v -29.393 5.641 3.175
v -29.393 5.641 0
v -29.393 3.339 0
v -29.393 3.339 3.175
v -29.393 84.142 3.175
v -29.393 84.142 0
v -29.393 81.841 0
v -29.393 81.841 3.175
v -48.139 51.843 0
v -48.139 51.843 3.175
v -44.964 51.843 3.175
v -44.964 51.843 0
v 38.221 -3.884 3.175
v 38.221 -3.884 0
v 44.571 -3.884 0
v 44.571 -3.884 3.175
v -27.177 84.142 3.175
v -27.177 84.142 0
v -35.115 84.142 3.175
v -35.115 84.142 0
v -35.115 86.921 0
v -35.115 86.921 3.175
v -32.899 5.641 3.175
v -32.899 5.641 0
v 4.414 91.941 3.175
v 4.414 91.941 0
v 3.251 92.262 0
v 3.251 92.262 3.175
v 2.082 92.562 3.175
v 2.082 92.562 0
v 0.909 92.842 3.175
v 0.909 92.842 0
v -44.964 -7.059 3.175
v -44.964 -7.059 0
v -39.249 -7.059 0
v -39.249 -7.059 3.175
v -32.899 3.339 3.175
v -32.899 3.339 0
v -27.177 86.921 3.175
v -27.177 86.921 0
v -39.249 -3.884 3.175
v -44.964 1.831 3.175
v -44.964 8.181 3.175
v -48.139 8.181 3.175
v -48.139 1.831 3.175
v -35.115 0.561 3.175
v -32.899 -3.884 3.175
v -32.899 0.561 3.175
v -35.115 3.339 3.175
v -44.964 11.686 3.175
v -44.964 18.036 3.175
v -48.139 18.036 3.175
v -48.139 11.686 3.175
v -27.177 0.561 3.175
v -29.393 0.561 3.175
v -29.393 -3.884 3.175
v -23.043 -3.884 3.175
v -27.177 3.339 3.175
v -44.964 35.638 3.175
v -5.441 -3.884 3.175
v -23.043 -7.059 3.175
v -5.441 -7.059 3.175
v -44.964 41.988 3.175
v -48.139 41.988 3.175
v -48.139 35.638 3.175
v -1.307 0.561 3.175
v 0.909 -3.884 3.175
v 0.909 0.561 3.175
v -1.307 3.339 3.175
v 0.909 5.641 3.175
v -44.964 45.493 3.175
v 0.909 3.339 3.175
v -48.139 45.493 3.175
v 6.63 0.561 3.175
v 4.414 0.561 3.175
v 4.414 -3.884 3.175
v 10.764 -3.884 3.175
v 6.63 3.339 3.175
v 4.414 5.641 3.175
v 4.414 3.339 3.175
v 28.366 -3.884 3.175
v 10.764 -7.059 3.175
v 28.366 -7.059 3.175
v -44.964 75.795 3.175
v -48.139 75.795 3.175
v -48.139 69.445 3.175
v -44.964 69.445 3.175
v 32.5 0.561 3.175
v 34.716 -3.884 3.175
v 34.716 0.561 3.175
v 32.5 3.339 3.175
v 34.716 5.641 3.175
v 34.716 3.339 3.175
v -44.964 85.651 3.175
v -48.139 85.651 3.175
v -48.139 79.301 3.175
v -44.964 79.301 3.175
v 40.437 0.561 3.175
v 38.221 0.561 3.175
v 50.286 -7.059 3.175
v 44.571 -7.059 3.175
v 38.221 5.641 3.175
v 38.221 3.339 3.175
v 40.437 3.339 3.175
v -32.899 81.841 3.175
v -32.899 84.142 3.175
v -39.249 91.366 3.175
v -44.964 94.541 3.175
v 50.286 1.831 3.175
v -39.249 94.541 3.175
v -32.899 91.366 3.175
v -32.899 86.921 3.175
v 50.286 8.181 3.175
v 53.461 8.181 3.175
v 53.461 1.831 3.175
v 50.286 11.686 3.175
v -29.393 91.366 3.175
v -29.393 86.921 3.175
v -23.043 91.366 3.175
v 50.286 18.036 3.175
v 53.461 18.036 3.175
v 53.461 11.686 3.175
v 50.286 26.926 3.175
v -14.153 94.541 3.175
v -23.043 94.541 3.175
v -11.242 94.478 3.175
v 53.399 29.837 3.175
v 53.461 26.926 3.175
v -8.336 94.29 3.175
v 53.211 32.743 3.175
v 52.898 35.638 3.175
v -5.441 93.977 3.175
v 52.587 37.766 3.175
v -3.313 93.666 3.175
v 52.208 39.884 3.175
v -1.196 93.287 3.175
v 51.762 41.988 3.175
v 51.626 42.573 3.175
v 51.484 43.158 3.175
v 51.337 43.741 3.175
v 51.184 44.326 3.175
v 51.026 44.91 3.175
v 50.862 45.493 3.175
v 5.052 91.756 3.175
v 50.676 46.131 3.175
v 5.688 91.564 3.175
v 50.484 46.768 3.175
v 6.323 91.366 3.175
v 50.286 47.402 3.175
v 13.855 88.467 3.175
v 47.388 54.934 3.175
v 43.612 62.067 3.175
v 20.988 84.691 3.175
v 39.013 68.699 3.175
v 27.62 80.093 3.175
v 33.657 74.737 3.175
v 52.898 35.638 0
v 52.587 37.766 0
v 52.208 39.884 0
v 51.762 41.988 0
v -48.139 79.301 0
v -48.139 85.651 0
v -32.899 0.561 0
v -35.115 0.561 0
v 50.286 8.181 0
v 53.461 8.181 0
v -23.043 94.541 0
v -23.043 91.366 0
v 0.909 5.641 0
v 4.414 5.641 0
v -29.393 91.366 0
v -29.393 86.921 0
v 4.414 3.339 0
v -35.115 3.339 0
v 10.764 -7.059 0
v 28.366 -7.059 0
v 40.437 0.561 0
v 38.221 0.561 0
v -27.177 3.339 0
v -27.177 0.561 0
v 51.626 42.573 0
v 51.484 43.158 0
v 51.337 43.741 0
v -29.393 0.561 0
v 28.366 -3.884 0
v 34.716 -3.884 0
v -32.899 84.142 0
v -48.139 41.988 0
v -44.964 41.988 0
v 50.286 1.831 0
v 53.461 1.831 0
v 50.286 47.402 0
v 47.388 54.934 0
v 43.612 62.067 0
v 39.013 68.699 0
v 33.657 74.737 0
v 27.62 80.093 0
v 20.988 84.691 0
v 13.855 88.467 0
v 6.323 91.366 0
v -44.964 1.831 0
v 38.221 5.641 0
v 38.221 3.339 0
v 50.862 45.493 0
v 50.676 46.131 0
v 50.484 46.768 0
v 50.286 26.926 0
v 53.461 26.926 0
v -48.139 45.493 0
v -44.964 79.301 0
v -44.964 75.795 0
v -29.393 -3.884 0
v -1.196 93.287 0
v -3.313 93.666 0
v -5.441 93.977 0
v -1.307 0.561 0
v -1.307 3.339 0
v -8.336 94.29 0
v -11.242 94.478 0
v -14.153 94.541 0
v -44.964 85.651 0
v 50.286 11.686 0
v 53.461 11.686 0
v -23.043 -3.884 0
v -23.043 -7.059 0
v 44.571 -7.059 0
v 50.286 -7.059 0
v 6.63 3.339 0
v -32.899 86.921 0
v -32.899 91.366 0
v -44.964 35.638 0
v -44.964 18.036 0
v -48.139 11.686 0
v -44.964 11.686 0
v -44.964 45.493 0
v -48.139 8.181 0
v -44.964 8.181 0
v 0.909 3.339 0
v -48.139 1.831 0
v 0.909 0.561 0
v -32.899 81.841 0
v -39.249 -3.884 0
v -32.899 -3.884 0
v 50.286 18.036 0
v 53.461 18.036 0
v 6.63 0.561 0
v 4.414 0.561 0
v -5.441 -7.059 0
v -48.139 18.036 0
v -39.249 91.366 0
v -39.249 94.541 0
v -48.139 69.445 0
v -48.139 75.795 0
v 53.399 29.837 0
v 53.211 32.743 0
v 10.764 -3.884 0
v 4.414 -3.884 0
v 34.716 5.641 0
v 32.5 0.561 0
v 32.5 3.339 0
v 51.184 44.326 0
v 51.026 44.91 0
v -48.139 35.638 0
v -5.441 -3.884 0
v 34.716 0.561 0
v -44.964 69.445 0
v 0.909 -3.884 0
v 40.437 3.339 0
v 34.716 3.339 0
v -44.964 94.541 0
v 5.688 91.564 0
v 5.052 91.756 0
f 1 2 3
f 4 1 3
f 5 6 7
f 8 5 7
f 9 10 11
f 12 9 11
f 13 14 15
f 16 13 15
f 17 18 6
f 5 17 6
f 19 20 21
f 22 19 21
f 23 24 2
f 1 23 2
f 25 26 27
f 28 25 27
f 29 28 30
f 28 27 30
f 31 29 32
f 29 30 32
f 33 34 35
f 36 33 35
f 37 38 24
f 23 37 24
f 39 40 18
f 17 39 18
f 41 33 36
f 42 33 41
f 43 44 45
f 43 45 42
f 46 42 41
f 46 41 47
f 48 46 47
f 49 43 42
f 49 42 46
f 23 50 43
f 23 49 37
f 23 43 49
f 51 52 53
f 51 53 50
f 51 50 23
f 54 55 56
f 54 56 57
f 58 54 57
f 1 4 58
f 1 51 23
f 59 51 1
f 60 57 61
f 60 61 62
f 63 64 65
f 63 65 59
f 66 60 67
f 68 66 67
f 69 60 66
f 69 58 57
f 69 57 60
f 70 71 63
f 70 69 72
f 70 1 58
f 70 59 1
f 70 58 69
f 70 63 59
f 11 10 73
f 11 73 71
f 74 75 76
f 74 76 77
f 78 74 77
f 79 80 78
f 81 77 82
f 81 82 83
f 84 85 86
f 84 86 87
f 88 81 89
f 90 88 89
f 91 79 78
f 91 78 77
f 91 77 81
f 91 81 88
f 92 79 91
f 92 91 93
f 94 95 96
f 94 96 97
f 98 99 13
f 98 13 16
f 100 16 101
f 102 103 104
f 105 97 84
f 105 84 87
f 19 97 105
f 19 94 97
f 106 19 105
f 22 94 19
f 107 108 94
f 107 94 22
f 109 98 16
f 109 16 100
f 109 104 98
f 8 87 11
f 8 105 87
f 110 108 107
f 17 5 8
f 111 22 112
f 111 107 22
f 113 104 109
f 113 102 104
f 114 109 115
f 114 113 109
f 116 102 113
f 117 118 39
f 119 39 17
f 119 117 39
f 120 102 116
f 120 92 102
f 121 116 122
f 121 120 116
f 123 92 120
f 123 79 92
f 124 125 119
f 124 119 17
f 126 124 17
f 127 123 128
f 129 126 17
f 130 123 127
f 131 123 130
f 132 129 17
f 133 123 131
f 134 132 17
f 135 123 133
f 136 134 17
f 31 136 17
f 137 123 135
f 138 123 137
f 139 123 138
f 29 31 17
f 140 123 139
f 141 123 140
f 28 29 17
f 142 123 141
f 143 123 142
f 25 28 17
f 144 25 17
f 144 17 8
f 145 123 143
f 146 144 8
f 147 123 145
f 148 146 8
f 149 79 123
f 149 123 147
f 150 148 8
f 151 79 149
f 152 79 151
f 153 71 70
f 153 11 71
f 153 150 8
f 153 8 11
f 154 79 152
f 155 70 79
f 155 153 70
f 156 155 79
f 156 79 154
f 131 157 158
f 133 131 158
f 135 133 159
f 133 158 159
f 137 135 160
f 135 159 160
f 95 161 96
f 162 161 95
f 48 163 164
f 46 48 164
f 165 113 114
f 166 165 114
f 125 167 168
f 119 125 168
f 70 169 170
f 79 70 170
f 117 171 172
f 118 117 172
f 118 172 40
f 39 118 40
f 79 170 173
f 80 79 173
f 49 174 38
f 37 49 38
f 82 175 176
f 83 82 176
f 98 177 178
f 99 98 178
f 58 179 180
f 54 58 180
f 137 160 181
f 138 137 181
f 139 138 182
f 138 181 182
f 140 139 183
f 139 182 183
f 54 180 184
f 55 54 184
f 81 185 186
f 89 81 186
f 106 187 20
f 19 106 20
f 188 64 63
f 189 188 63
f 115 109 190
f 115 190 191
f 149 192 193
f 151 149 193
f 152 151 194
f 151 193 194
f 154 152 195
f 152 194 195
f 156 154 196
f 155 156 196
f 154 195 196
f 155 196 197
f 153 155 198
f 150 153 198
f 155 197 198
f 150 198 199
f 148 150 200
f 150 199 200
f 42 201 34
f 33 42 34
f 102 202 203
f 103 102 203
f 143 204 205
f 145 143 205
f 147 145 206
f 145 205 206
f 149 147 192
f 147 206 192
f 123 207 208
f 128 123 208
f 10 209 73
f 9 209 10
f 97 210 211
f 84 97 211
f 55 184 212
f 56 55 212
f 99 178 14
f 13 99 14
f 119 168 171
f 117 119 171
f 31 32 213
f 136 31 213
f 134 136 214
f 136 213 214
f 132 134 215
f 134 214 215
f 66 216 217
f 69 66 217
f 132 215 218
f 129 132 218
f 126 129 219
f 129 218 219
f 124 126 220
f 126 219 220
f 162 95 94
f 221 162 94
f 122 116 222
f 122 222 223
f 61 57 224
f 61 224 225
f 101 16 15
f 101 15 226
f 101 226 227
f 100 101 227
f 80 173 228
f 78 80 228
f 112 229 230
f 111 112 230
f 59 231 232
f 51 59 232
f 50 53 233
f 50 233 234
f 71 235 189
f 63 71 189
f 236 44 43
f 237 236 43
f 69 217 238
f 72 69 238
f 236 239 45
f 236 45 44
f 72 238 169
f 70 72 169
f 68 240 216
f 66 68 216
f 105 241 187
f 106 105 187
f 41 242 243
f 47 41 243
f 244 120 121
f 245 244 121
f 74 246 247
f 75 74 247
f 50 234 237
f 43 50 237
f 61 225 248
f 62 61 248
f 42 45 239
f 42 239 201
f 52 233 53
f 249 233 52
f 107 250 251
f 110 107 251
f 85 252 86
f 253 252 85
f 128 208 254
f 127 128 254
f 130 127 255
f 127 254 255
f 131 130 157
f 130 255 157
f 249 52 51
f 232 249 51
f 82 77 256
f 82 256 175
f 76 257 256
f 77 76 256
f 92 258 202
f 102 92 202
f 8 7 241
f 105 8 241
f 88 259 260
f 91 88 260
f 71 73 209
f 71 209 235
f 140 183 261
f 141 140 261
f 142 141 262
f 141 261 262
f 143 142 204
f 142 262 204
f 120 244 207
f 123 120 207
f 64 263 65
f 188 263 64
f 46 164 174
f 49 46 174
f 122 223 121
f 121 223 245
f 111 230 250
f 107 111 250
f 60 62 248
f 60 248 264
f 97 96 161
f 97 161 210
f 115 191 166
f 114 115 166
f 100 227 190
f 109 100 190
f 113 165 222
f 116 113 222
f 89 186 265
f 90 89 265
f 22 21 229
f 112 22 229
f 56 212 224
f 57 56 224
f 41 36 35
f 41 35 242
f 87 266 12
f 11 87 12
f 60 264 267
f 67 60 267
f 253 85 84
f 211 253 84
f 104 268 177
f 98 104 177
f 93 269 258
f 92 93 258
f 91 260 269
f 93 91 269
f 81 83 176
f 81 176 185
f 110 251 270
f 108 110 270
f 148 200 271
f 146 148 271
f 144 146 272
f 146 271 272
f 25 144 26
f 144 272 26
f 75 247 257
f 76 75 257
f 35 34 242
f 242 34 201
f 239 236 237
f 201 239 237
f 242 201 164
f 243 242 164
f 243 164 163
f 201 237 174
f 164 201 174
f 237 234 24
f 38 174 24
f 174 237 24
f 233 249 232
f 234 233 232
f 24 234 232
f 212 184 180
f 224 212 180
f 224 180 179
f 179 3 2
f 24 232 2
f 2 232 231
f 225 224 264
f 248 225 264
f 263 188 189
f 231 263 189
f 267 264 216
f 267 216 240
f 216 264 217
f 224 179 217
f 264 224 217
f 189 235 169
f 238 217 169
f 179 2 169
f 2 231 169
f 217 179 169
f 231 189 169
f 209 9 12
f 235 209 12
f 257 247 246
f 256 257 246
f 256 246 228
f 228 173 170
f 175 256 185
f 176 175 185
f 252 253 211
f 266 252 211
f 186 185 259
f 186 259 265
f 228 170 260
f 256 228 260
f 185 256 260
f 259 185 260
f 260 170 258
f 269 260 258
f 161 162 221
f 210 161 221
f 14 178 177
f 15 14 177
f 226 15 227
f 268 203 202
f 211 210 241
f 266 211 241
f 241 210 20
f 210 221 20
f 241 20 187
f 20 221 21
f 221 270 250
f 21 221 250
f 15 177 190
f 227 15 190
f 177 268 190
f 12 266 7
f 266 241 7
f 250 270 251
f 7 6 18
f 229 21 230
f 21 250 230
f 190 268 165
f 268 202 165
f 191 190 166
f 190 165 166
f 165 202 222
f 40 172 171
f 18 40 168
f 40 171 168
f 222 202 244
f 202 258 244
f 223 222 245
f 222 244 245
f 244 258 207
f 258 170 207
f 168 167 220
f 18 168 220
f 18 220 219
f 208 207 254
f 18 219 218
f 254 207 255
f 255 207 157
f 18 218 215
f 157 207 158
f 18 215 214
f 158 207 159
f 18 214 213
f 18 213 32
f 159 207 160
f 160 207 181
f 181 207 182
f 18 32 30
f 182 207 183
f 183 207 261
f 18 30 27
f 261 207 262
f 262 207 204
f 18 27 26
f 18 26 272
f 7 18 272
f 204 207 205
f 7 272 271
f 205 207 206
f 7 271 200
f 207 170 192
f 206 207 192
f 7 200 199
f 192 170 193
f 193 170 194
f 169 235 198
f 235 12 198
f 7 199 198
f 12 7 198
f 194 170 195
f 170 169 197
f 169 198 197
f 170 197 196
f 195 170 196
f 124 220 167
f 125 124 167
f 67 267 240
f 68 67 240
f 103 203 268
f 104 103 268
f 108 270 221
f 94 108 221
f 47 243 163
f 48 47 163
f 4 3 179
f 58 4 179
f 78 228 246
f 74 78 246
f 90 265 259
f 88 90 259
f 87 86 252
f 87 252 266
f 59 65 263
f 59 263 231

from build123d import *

# Parameters (mm, degrees)
F0_W     = 3.175
F0_H     = 6.35
F0_W_2   = 3.5052
F0_H_2   = 4.445
F0_H_3   = 2.778125
F0_W_3   = 2.21615
F0_H_4   = 2.301875
F1_DEPTH = 3.175


with BuildPart() as f1:
    # F0 (on Top) → F1 (new body)
    with BuildSketch(Plane.XY):
        with BuildLine():
            Line((-39.248683933, 94.5405161858), (-44.963683933, 94.5405161858))
            Line((-44.963683933, 94.5405161858), (-44.963683933, 85.6505161858))
            Line((-44.963683933, 85.6505161858), (-44.963683933, 79.3005161858))
            Line((-44.963683933, 79.3005161858), (-44.963683933, 75.7953161858))
            Line((-44.963683933, 75.7953161858), (-44.963683933, 69.4453161858))
            Line((-44.963683933, 69.4453161858), (-44.963683933, 51.8431161858))
            Line((-44.963683933, 51.8431161858), (-44.963683933, 45.4931161858))
            Line((-44.963683933, 45.4931161858), (-44.963683933, 43.7405161858))
            Line((-44.963683933, 43.7405161858), (50.286316067, 43.7405161858))
            Line((50.286316067, 43.7405161858), (50.286316067, 45.4931161858))
            Line((50.286316067, 45.4931161858), (50.286316067, 47.4018817204))
            ThreePointArc((50.286316067, 47.4018817204), (33.6573996556, 74.7365997743), (6.3226816016, 91.3655161858))
            Line((6.3226816016, 91.3655161858), (4.413916067, 91.3655161858))
            Line((4.413916067, 91.3655161858), (4.413916067, 86.9205161858))
            Line((4.413916067, 86.9205161858), (6.630066067, 86.9205161858))
            Line((6.630066067, 86.9205161858), (6.630066067, 84.1423911858))
            Line((6.630066067, 84.1423911858), (4.413916067, 84.1423911858))
            Line((4.413916067, 84.1423911858), (4.413916067, 81.8405161858))
            Line((4.413916067, 81.8405161858), (0.908716067, 81.8405161858))
            Line((0.908716067, 81.8405161858), (0.908716067, 84.1423911858))
            Line((0.908716067, 84.1423911858), (-1.307433933, 84.1423911858))
            Line((-1.307433933, 84.1423911858), (-1.307433933, 86.9205161858))
            Line((-1.307433933, 86.9205161858), (0.908716067, 86.9205161858))
            Line((0.908716067, 86.9205161858), (0.908716067, 91.3655161858))
            Line((0.908716067, 91.3655161858), (-5.441283933, 91.3655161858))
            Line((-5.441283933, 91.3655161858), (-5.441283933, 93.9768813524))
            ThreePointArc((-5.441283933, 93.9768813524), (-9.7882773782, 94.3994603443), (-14.153483933, 94.5405161858))
            Line((-14.153483933, 94.5405161858), (-23.043483933, 94.5405161858))
            Line((-23.043483933, 94.5405161858), (-23.043483933, 91.3655161858))
            Line((-23.043483933, 91.3655161858), (-29.393483933, 91.3655161858))
            Line((-29.393483933, 91.3655161858), (-29.393483933, 86.9205161858))
            Line((-29.393483933, 86.9205161858), (-27.177333933, 86.9205161858))
            Line((-27.177333933, 86.9205161858), (-27.177333933, 84.1423911858))
            Line((-27.177333933, 84.1423911858), (-29.393483933, 84.1423911858))
            Line((-29.393483933, 84.1423911858), (-29.393483933, 81.8405161858))
            Line((-29.393483933, 81.8405161858), (-32.898683933, 81.8405161858))
            Line((-32.898683933, 81.8405161858), (-32.898683933, 84.1423911858))
            Line((-32.898683933, 84.1423911858), (-35.114833933, 84.1423911858))
            Line((-35.114833933, 84.1423911858), (-35.114833933, 86.9205161858))
            Line((-35.114833933, 86.9205161858), (-32.898683933, 86.9205161858))
            Line((-32.898683933, 86.9205161858), (-32.898683933, 91.3655161858))
            Line((-32.898683933, 91.3655161858), (-39.248683933, 91.3655161858))
            Line((-39.248683933, 91.3655161858), (-39.248683933, 94.5405161858))
        make_face()
        with Locations((-46.551183933, 82.4755161858)):
            Rectangle(F0_W, F0_H)
        with Locations((-46.551183933, 72.6203161858)):
            Rectangle(F0_W, F0_H)
        with Locations((-46.551183933, 48.6681161858)):
            Rectangle(F0_W, F0_H)
        with BuildLine():
            ThreePointArc((0.908716067, 92.8415057221), (-2.252736339, 93.4849633701), (-5.441283933, 93.9768813524))
            Line((-5.441283933, 93.9768813524), (-5.441283933, 91.3655161858))
            Line((-5.441283933, 91.3655161858), (0.908716067, 91.3655161858))
            Line((0.908716067, 91.3655161858), (0.908716067, 92.8415057221))
        make_face()
        with BuildLine():
            ThreePointArc((4.413916067, 91.9411976981), (2.6673405912, 92.4148071961), (0.908716067, 92.8415057221))
            Line((0.908716067, 92.8415057221), (0.908716067, 91.3655161858))
            Line((0.908716067, 91.3655161858), (4.413916067, 91.3655161858))
            Line((4.413916067, 91.3655161858), (4.413916067, 91.9411976981))
        make_face()
        Polygon((50.286316067, 43.7405161858), (-44.963683933, 43.7405161858), (-44.963683933, 41.9879161858), (-44.963683933, 35.6379161858), (-44.963683933, 18.0357161858), (-44.963683933, 11.6857161858), (-44.963683933, 8.1805161858), (-44.963683933, 1.8305161858), (-44.963683933, -7.0594838142), (-39.248683933, -7.0594838142), (-39.248683933, -3.8844838142), (-32.898683933, -3.8844838142), (-32.898683933, 0.5605161858), (-35.114833933, 0.5605161858), (-35.114833933, 3.3386411858), (-32.898683933, 3.3386411858), (-32.898683933, 5.6405161858), (-29.393483933, 5.6405161858), (-29.393483933, 3.3386411858), (-27.177333933, 3.3386411858), (-27.177333933, 0.5605161858), (-29.393483933, 0.5605161858), (-29.393483933, -3.8844838142), (-23.043483933, -3.8844838142), (-23.043483933, -7.0594838142), (-5.441283933, -7.0594838142), (-5.441283933, -3.8844838142), (0.908716067, -3.8844838142), (0.908716067, 0.5605161858), (-1.307433933, 0.5605161858), (-1.307433933, 3.3386411858), (0.908716067, 3.3386411858), (0.908716067, 5.6405161858), (4.413916067, 5.6405161858), (4.413916067, 3.3386411858), (6.630066067, 3.3386411858), (6.630066067, 0.5605161858), (4.413916067, 0.5605161858), (4.413916067, -3.8844838142), (10.763916067, -3.8844838142), (10.763916067, -7.0594838142), (28.366116067, -7.0594838142), (28.366116067, -3.8844838142), (34.716116067, -3.8844838142), (34.716116067, 0.5605161858), (32.499966067, 0.5605161858), (32.499966067, 3.3386411858), (34.716116067, 3.3386411858), (34.716116067, 5.6405161858), (38.221316067, 5.6405161858), (38.221316067, 3.3386411858), (40.437466067, 3.3386411858), (40.437466067, 0.5605161858), (38.221316067, 0.5605161858), (38.221316067, -3.8844838142), (44.571316067, -3.8844838142), (44.571316067, -7.0594838142), (50.286316067, -7.0594838142), (50.286316067, 1.8305161858), (50.286316067, 8.1805161858), (50.286316067, 11.6857161858), (50.286316067, 18.0357161858), (50.286316067, 26.9257161858), (50.286316067, 35.6379161858), (50.286316067, 41.9879161858), align=None)
        with Locations((-46.551183933, 38.8129161858)):
            Rectangle(F0_W, F0_H)
        with Locations((2.661316067, 89.1430161858)):
            Rectangle(F0_W_2, F0_H_2)
        with BuildLine():
            ThreePointArc((6.3226816016, 91.3655161858), (5.3704207665, 91.6603925526), (4.413916067, 91.9411976981))
            Line((4.413916067, 91.9411976981), (4.413916067, 91.3655161858))
            Line((4.413916067, 91.3655161858), (6.3226816016, 91.3655161858))
        make_face()
        with BuildLine():
            Line((50.286316067, 45.4931161858), (50.286316067, 43.7405161858))
            Line((50.286316067, 43.7405161858), (51.3371541766, 43.7405161858))
            ThreePointArc((51.3371541766, 43.7405161858), (51.1054596409, 44.6184113637), (50.8619975793, 45.4931161858))
            Line((50.8619975793, 45.4931161858), (50.286316067, 45.4931161858))
        make_face()
        with BuildLine():
            Line((51.3371541766, 43.7405161858), (50.286316067, 43.7405161858))
            Line((50.286316067, 43.7405161858), (50.286316067, 41.9879161858))
            Line((50.286316067, 41.9879161858), (51.7623056033, 41.9879161858))
            ThreePointArc((51.7623056033, 41.9879161858), (51.5555733449, 42.8656337101), (51.3371541766, 43.7405161858))
        make_face()
        with Locations((2.661316067, 85.5314536858)):
            Rectangle(F0_W_2, F0_H_3)
        with Locations((-0.199358933, 85.5314536858)):
            Rectangle(F0_W_3, F0_H_3)
        with BuildLine():
            Line((51.7623056033, 41.9879161858), (50.286316067, 41.9879161858))
            Line((50.286316067, 41.9879161858), (50.286316067, 35.6379161858))
            Line((50.286316067, 35.6379161858), (52.8976812336, 35.6379161858))
            ThreePointArc((52.8976812336, 35.6379161858), (52.4057632513, 38.8264637797), (51.7623056033, 41.9879161858))
        make_face()
        with BuildLine():
            Line((50.286316067, 47.4018817204), (50.286316067, 45.4931161858))
            Line((50.286316067, 45.4931161858), (50.8619975793, 45.4931161858))
            ThreePointArc((50.8619975793, 45.4931161858), (50.5811924339, 46.4496208852), (50.286316067, 47.4018817204))
        make_face()
        with Locations((-46.551183933, 14.8607161858)):
            Rectangle(F0_W, F0_H)
        with Locations((5.521991067, 85.5314536858)):
            Rectangle(F0_W_3, F0_H_3)
        with Locations((2.661316067, 82.9914536858)):
            Rectangle(F0_W_2, F0_H_4)
        with BuildLine():
            Line((52.8976812336, 35.6379161858), (50.286316067, 35.6379161858))
            Line((50.286316067, 35.6379161858), (50.286316067, 26.9257161858))
            Line((50.286316067, 26.9257161858), (53.461316067, 26.9257161858))
            ThreePointArc((53.461316067, 26.9257161858), (53.3202602255, 31.2909227406), (52.8976812336, 35.6379161858))
        make_face()
        with Locations((-46.551183933, 5.0055161858)):
            Rectangle(F0_W, F0_H)
        with Locations((51.873816067, 14.8607161858)):
            Rectangle(F0_W, F0_H)
        with Locations((51.873816067, 5.0055161858)):
            Rectangle(F0_W, F0_H)
    extrude(amount=F1_DEPTH)


solid = f1.part
